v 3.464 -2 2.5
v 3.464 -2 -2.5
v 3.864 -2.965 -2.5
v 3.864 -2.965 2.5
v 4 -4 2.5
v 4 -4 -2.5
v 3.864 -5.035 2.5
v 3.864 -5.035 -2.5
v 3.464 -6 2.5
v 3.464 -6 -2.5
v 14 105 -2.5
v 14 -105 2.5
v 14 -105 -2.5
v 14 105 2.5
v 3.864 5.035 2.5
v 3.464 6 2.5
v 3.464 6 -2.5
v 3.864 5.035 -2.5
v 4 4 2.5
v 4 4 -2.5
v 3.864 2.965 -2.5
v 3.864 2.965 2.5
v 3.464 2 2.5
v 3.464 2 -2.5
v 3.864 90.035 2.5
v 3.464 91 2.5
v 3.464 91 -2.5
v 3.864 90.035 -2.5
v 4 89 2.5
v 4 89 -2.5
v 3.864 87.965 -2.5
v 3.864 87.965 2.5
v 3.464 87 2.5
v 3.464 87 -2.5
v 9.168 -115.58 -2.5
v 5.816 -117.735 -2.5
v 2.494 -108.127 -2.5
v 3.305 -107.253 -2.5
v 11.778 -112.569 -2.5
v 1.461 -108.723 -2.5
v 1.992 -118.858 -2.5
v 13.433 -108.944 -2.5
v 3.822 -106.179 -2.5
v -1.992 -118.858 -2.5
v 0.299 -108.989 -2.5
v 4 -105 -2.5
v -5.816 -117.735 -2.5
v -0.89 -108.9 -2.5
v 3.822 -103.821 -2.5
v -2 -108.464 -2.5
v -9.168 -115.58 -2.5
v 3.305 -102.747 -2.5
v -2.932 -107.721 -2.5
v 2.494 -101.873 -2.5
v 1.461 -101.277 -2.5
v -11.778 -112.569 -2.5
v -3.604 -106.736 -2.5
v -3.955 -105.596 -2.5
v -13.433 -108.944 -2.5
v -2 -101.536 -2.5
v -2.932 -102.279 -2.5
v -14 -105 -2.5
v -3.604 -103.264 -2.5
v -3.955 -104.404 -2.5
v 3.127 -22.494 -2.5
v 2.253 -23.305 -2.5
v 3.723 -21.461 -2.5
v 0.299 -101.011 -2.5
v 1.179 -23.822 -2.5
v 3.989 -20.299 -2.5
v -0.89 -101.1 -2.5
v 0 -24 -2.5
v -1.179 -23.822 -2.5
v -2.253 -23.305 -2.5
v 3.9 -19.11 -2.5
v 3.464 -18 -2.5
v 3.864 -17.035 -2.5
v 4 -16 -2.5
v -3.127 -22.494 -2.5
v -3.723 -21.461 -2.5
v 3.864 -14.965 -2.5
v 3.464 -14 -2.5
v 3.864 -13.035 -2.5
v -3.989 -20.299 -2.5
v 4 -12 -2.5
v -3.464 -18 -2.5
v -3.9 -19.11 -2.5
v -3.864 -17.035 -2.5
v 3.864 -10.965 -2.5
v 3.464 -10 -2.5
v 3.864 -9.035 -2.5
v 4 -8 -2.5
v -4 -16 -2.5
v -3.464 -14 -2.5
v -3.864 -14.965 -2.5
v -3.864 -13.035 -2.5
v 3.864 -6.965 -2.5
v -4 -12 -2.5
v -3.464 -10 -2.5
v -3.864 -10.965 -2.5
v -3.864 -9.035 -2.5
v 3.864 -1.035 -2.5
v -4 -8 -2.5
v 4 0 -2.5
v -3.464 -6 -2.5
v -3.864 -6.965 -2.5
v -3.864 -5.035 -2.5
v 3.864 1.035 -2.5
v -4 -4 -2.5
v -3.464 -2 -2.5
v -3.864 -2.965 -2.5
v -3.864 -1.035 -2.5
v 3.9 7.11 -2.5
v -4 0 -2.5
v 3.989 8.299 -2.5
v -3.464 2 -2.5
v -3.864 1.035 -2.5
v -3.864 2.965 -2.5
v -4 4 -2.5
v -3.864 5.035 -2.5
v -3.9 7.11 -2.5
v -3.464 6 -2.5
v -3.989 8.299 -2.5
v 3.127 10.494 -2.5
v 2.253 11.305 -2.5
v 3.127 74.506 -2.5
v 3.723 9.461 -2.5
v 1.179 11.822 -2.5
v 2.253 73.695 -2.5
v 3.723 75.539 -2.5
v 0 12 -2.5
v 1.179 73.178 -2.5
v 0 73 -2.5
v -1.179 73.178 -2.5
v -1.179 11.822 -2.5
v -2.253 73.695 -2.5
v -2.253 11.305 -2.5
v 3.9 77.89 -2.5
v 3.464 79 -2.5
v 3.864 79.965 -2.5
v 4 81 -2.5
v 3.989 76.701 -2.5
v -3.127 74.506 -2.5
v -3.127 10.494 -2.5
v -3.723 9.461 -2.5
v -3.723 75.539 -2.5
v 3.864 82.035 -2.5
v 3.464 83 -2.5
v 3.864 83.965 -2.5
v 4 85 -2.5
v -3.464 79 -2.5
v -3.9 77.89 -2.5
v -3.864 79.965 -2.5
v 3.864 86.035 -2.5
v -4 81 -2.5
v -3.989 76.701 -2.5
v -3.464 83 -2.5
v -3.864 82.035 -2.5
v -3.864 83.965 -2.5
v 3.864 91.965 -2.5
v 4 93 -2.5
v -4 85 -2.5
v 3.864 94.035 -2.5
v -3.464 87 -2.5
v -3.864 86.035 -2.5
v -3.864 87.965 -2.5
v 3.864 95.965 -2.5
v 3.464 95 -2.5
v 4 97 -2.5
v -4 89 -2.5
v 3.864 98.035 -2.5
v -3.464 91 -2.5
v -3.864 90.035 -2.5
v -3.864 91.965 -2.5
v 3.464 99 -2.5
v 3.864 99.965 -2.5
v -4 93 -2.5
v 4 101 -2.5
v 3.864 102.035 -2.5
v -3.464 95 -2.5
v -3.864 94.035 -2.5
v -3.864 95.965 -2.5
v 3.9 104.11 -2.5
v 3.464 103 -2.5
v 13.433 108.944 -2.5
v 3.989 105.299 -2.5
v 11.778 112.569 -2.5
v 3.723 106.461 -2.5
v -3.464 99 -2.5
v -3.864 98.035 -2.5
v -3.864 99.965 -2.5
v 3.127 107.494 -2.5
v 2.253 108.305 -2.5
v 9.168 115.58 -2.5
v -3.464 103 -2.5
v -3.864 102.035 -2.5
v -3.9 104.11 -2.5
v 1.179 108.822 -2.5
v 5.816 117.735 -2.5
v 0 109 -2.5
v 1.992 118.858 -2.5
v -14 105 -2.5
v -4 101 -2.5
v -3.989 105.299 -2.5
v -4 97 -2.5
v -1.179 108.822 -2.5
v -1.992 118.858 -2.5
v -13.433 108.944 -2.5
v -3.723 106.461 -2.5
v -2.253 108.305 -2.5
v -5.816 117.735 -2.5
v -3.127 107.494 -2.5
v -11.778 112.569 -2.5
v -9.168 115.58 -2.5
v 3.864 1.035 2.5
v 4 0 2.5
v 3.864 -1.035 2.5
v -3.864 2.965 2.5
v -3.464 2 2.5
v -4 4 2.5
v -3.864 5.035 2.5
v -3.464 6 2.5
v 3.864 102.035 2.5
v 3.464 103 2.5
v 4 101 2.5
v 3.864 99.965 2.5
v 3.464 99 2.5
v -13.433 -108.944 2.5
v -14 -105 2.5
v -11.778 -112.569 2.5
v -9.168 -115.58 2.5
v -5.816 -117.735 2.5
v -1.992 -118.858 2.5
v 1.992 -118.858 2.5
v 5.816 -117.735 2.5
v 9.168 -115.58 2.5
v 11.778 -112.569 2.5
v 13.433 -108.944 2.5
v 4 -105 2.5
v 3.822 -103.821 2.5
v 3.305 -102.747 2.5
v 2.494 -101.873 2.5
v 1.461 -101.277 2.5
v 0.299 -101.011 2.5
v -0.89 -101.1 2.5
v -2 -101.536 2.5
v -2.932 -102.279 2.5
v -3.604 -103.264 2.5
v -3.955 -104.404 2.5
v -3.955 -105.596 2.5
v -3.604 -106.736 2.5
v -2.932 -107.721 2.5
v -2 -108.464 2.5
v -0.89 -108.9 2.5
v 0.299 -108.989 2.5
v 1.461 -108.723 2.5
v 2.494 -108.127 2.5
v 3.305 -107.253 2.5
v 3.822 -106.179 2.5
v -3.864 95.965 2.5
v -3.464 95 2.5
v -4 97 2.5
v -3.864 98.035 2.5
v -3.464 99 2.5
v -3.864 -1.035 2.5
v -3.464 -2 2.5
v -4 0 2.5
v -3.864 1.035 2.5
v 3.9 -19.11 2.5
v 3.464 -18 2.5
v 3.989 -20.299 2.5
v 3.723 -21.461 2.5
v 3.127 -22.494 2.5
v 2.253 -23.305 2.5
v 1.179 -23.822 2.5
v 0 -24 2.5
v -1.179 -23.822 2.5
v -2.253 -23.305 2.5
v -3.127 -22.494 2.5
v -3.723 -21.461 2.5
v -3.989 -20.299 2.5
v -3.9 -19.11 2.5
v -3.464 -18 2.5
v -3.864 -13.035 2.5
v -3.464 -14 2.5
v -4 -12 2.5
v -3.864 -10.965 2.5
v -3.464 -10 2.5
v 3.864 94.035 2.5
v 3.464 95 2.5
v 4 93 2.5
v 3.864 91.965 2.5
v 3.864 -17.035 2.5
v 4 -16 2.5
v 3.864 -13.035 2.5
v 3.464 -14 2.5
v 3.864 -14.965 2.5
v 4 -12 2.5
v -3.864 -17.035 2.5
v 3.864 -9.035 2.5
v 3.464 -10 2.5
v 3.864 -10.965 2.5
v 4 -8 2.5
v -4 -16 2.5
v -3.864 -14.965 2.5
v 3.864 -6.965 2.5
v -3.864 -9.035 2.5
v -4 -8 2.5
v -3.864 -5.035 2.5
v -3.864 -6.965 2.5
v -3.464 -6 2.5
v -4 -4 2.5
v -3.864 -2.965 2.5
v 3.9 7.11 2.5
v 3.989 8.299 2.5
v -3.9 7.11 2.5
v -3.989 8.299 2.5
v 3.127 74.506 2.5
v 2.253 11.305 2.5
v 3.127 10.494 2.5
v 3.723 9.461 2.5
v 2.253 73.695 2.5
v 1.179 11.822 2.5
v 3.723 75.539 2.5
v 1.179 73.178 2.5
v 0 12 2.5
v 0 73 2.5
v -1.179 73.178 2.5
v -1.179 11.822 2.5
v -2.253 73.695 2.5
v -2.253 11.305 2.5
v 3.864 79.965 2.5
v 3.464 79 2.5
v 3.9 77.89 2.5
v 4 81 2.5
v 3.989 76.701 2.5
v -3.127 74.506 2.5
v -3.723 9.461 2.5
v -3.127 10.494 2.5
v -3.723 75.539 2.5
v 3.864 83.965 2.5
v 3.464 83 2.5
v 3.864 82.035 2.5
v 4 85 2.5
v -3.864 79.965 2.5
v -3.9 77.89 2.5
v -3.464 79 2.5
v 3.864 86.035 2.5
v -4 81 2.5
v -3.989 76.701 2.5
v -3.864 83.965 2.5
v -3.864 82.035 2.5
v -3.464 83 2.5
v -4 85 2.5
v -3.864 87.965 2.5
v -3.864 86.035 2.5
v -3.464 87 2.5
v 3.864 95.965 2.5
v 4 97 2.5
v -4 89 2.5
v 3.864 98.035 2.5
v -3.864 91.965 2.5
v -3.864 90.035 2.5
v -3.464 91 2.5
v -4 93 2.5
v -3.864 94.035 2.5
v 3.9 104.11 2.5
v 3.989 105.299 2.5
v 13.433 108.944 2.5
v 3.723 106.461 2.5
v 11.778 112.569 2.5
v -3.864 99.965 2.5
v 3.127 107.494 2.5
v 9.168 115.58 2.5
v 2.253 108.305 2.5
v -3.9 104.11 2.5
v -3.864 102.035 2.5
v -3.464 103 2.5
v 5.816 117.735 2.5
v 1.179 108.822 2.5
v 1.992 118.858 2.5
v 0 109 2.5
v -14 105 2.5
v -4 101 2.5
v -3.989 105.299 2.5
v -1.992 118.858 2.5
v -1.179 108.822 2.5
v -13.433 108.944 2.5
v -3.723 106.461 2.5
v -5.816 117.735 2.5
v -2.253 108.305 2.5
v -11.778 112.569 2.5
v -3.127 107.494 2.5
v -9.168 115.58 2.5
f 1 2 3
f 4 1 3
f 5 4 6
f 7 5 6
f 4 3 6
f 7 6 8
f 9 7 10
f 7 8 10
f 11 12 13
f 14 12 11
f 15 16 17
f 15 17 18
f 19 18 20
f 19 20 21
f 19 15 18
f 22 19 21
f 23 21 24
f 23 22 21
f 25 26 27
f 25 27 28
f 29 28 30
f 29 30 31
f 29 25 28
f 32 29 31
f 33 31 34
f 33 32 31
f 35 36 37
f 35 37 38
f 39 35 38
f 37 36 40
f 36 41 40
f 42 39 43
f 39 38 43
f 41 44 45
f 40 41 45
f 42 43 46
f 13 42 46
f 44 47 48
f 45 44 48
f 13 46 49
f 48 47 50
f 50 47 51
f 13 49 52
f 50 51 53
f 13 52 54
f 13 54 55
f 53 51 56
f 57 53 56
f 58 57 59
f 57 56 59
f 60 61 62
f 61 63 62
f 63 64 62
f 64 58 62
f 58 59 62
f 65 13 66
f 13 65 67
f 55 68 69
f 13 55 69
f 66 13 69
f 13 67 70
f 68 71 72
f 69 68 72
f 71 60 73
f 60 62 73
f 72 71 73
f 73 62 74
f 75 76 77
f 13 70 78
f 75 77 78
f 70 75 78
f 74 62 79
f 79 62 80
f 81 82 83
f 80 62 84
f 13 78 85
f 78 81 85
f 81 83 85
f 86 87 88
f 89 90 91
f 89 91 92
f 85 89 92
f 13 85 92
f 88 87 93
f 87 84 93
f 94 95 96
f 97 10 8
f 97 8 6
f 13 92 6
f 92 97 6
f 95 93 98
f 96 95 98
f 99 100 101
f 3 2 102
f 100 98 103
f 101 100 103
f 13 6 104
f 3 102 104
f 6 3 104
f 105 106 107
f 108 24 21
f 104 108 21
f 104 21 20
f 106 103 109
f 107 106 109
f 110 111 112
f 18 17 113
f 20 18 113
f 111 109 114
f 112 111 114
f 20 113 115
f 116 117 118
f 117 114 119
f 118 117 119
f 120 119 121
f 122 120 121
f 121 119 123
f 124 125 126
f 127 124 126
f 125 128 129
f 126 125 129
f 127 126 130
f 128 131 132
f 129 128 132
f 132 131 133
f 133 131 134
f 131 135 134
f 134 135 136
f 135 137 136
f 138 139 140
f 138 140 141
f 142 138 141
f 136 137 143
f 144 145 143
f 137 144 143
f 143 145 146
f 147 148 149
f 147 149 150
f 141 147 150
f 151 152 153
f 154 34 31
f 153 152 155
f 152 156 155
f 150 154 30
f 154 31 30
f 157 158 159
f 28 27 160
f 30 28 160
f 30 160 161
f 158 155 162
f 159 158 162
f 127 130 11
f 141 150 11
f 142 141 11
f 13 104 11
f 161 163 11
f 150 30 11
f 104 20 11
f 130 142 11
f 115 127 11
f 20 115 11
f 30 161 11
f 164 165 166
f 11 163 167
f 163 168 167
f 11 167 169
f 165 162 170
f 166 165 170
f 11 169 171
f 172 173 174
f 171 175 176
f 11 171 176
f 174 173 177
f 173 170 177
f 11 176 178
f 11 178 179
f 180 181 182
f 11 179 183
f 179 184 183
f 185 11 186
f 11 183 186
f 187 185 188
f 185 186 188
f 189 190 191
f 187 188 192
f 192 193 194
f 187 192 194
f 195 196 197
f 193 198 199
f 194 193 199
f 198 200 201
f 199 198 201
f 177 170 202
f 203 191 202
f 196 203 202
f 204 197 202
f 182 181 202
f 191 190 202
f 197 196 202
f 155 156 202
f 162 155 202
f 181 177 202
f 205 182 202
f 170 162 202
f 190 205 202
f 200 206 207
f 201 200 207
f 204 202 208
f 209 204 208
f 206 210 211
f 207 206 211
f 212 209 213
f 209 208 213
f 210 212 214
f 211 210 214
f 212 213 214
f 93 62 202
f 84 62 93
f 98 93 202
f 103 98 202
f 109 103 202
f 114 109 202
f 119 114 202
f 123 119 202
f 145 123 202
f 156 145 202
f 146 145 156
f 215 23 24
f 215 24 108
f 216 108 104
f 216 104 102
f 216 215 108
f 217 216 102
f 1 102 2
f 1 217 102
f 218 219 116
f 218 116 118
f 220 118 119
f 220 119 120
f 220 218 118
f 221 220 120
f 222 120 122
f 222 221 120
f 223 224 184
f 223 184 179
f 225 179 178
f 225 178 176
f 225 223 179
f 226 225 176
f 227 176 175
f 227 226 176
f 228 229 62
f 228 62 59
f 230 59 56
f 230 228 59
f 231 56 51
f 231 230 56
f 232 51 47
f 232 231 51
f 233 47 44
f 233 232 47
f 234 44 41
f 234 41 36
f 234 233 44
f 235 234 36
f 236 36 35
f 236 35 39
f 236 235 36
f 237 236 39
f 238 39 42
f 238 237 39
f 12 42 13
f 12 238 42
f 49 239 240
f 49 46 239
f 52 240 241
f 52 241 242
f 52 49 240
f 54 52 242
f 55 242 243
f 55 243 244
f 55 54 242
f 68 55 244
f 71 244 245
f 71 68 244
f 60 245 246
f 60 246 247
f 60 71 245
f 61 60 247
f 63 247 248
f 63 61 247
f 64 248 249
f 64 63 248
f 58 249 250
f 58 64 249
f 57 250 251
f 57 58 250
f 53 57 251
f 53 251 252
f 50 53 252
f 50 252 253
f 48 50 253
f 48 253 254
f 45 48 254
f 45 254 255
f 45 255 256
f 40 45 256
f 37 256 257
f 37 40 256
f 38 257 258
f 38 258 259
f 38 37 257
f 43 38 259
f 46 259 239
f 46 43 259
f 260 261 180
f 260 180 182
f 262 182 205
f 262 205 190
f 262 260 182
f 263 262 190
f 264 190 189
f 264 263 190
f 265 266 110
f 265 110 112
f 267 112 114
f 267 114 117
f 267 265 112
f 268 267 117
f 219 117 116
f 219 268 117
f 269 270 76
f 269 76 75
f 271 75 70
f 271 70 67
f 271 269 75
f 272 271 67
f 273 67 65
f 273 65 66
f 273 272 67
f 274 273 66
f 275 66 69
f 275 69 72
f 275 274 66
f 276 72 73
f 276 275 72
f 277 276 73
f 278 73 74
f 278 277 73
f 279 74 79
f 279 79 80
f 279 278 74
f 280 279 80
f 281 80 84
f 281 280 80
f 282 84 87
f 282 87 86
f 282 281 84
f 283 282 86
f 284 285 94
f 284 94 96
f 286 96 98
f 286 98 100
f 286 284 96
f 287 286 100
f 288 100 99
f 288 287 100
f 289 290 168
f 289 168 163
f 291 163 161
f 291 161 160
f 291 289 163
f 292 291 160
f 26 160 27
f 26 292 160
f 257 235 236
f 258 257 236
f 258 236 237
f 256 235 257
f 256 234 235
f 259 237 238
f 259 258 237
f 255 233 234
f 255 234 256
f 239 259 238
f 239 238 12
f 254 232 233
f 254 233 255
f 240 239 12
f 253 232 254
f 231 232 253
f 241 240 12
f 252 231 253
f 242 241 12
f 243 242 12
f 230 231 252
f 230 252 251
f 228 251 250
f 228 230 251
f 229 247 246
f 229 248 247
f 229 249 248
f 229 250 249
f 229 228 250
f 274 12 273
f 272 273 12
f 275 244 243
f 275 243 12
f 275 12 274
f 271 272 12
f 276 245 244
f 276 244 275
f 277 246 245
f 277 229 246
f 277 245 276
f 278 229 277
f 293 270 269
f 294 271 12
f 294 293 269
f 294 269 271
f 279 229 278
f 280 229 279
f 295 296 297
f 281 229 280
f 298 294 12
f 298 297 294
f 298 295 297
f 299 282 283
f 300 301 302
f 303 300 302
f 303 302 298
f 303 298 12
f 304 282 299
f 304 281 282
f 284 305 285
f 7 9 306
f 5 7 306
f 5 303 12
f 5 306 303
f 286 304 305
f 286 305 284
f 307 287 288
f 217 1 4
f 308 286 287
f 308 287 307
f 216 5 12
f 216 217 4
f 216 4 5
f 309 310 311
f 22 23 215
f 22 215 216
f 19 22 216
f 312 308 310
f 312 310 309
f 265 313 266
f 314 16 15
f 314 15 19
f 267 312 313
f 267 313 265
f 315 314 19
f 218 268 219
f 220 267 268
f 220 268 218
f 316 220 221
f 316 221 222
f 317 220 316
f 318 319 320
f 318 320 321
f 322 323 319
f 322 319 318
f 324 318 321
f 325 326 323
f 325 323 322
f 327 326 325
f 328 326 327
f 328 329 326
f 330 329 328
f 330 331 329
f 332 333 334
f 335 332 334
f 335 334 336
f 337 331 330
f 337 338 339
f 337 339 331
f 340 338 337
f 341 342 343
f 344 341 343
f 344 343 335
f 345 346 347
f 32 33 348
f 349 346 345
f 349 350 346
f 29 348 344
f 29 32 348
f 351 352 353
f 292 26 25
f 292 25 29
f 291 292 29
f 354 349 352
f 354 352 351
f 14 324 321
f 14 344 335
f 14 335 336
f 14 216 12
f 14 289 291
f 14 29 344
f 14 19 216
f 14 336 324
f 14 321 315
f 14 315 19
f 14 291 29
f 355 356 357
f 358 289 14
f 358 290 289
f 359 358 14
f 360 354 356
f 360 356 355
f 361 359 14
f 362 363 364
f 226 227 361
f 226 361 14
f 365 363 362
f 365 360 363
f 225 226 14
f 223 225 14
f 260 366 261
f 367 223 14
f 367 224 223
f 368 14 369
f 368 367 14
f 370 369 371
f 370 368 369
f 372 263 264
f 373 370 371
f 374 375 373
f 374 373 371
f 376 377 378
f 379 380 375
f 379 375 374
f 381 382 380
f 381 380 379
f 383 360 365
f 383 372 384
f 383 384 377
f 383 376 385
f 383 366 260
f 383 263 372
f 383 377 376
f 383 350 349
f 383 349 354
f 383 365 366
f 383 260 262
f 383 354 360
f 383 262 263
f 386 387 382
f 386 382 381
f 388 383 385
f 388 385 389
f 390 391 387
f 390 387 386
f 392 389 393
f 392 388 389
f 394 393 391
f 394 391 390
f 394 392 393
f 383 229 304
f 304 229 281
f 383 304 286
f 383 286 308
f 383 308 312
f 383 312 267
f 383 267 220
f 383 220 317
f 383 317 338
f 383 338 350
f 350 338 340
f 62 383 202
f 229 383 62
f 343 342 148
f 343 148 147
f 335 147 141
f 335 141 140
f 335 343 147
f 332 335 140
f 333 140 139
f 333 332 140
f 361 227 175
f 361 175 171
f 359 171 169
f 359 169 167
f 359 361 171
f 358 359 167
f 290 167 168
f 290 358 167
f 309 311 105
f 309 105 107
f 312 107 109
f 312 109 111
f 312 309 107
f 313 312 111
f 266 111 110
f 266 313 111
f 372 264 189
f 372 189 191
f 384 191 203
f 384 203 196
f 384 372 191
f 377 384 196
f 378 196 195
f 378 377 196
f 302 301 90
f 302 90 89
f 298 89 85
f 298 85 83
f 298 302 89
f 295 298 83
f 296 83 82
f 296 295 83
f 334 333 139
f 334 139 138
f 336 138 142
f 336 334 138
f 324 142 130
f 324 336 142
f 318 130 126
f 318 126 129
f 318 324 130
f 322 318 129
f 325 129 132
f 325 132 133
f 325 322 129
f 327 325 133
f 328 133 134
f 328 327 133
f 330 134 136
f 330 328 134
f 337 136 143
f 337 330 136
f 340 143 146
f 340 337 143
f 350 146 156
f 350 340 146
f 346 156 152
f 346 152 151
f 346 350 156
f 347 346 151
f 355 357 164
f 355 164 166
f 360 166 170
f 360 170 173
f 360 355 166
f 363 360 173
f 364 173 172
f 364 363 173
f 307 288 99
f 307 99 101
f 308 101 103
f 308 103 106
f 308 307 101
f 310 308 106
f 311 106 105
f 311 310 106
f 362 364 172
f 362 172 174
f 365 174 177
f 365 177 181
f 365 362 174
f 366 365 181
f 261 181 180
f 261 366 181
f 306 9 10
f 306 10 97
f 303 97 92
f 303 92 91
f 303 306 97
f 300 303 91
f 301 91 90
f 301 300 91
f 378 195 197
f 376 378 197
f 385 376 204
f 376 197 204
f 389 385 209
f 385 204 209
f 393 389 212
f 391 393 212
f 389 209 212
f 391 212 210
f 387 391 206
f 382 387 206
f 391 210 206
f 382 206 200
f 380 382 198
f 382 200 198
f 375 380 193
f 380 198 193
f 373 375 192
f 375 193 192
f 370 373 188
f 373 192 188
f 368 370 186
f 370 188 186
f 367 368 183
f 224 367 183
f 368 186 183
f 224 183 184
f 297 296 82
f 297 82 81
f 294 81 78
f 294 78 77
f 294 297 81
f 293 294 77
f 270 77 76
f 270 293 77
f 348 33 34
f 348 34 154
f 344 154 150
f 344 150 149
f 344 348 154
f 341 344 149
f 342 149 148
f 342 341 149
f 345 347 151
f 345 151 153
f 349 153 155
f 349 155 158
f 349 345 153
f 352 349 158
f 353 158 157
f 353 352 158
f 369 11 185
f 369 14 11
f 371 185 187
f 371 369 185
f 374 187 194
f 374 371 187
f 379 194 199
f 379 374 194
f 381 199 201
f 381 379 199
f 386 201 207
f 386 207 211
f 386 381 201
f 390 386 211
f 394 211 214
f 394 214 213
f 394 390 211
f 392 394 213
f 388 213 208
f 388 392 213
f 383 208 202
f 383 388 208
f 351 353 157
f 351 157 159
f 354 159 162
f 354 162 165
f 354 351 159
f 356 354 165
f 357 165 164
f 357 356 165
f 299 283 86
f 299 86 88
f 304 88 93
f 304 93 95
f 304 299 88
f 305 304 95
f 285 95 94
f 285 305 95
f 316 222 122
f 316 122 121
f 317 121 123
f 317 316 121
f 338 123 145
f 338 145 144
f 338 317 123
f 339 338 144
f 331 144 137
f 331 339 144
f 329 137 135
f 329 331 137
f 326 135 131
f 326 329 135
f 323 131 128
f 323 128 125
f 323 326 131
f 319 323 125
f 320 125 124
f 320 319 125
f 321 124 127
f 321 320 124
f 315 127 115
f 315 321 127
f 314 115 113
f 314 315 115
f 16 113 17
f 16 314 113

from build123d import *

# Parameters (mm, degrees)
SKETCH1_R           = 4
BOSS_EXTRUDE1_DEPTH = 2.5


with BuildPart() as part:
    # Sketch1 → Boss-Extrude1 (new, symmetric)
    with BuildSketch(Plane(origin=(0, 0, 0), x_dir=(0, 1, 0), z_dir=(0, 0, 1))):
        with BuildLine():
            Line((105, 14), (-105, 14))
            ThreePointArc((-105, 14), (-119, 0), (-105, -14))
            Line((-105, -14), (105, -14))
            ThreePointArc((105, -14), (119, 0), (105, 14))
        make_face()
        with Locations(Location((-105, 0, 0), (0, 0, 270))):
            Circle(SKETCH1_R, mode=Mode.SUBTRACT)
        with BuildLine():
            ThreePointArc((-2, 3.464101615), (0, 4), (2, 3.464101615))
            ThreePointArc((2, 3.464101615), (4, 4), (6, 3.464101615))
            ThreePointArc((6, 3.464101615), (10, 3.464101615), (12, 0))
            ThreePointArc((12, 0), (10, -3.464101615), (6, -3.464101615))
            ThreePointArc((6, -3.464101615), (4, -4), (2, -3.464101615))
            ThreePointArc((2, -3.464101615), (0, -4), (-2, -3.464101615))
            ThreePointArc((-2, -3.464101615), (-4, -4), (-6, -3.464101615))
            ThreePointArc((-6, -3.464101615), (-8, -4), (-10, -3.464101615))
            ThreePointArc((-10, -3.464101615), (-12, -4), (-14, -3.464101615))
            ThreePointArc((-14, -3.464101615), (-16, -4), (-18, -3.464101615))
            ThreePointArc((-18, -3.464101615), (-24, 0), (-18, 3.464101615))
            ThreePointArc((-18, 3.464101615), (-16, 4), (-14, 3.464101615))
            ThreePointArc((-14, 3.464101615), (-12, 4), (-10, 3.464101615))
            ThreePointArc((-10, 3.464101615), (-8, 4), (-6, 3.464101615))
            ThreePointArc((-6, 3.464101615), (-4, 4), (-2, 3.464101615))
        make_face(mode=Mode.SUBTRACT)
        with BuildLine():
            ThreePointArc((103, 3.464101615), (109, 0), (103, -3.464101615))
            ThreePointArc((103, -3.464101615), (101, -4), (99, -3.464101615))
            ThreePointArc((99, -3.464101615), (97, -4), (95, -3.464101615))
            ThreePointArc((95, -3.464101615), (93, -4), (91, -3.464101615))
            ThreePointArc((91, -3.464101615), (89, -4), (87, -3.464101615))
            ThreePointArc((87, -3.464101615), (85, -4), (83, -3.464101615))
            ThreePointArc((83, -3.464101615), (81, -4), (79, -3.464101615))
            ThreePointArc((79, -3.464101615), (73, 0), (79, 3.464101615))
            ThreePointArc((79, 3.464101615), (81, 4), (83, 3.464101615))
            ThreePointArc((83, 3.464101615), (85, 4), (87, 3.464101615))
            ThreePointArc((87, 3.464101615), (89, 4), (91, 3.464101615))
            ThreePointArc((91, 3.464101615), (93, 4), (95, 3.464101615))
            ThreePointArc((95, 3.464101615), (97, 4), (99, 3.464101615))
            ThreePointArc((99, 3.464101615), (101, 4), (103, 3.464101615))
        make_face(mode=Mode.SUBTRACT)
    extrude(amount=BOSS_EXTRUDE1_DEPTH, both=True)


solid = part.part
